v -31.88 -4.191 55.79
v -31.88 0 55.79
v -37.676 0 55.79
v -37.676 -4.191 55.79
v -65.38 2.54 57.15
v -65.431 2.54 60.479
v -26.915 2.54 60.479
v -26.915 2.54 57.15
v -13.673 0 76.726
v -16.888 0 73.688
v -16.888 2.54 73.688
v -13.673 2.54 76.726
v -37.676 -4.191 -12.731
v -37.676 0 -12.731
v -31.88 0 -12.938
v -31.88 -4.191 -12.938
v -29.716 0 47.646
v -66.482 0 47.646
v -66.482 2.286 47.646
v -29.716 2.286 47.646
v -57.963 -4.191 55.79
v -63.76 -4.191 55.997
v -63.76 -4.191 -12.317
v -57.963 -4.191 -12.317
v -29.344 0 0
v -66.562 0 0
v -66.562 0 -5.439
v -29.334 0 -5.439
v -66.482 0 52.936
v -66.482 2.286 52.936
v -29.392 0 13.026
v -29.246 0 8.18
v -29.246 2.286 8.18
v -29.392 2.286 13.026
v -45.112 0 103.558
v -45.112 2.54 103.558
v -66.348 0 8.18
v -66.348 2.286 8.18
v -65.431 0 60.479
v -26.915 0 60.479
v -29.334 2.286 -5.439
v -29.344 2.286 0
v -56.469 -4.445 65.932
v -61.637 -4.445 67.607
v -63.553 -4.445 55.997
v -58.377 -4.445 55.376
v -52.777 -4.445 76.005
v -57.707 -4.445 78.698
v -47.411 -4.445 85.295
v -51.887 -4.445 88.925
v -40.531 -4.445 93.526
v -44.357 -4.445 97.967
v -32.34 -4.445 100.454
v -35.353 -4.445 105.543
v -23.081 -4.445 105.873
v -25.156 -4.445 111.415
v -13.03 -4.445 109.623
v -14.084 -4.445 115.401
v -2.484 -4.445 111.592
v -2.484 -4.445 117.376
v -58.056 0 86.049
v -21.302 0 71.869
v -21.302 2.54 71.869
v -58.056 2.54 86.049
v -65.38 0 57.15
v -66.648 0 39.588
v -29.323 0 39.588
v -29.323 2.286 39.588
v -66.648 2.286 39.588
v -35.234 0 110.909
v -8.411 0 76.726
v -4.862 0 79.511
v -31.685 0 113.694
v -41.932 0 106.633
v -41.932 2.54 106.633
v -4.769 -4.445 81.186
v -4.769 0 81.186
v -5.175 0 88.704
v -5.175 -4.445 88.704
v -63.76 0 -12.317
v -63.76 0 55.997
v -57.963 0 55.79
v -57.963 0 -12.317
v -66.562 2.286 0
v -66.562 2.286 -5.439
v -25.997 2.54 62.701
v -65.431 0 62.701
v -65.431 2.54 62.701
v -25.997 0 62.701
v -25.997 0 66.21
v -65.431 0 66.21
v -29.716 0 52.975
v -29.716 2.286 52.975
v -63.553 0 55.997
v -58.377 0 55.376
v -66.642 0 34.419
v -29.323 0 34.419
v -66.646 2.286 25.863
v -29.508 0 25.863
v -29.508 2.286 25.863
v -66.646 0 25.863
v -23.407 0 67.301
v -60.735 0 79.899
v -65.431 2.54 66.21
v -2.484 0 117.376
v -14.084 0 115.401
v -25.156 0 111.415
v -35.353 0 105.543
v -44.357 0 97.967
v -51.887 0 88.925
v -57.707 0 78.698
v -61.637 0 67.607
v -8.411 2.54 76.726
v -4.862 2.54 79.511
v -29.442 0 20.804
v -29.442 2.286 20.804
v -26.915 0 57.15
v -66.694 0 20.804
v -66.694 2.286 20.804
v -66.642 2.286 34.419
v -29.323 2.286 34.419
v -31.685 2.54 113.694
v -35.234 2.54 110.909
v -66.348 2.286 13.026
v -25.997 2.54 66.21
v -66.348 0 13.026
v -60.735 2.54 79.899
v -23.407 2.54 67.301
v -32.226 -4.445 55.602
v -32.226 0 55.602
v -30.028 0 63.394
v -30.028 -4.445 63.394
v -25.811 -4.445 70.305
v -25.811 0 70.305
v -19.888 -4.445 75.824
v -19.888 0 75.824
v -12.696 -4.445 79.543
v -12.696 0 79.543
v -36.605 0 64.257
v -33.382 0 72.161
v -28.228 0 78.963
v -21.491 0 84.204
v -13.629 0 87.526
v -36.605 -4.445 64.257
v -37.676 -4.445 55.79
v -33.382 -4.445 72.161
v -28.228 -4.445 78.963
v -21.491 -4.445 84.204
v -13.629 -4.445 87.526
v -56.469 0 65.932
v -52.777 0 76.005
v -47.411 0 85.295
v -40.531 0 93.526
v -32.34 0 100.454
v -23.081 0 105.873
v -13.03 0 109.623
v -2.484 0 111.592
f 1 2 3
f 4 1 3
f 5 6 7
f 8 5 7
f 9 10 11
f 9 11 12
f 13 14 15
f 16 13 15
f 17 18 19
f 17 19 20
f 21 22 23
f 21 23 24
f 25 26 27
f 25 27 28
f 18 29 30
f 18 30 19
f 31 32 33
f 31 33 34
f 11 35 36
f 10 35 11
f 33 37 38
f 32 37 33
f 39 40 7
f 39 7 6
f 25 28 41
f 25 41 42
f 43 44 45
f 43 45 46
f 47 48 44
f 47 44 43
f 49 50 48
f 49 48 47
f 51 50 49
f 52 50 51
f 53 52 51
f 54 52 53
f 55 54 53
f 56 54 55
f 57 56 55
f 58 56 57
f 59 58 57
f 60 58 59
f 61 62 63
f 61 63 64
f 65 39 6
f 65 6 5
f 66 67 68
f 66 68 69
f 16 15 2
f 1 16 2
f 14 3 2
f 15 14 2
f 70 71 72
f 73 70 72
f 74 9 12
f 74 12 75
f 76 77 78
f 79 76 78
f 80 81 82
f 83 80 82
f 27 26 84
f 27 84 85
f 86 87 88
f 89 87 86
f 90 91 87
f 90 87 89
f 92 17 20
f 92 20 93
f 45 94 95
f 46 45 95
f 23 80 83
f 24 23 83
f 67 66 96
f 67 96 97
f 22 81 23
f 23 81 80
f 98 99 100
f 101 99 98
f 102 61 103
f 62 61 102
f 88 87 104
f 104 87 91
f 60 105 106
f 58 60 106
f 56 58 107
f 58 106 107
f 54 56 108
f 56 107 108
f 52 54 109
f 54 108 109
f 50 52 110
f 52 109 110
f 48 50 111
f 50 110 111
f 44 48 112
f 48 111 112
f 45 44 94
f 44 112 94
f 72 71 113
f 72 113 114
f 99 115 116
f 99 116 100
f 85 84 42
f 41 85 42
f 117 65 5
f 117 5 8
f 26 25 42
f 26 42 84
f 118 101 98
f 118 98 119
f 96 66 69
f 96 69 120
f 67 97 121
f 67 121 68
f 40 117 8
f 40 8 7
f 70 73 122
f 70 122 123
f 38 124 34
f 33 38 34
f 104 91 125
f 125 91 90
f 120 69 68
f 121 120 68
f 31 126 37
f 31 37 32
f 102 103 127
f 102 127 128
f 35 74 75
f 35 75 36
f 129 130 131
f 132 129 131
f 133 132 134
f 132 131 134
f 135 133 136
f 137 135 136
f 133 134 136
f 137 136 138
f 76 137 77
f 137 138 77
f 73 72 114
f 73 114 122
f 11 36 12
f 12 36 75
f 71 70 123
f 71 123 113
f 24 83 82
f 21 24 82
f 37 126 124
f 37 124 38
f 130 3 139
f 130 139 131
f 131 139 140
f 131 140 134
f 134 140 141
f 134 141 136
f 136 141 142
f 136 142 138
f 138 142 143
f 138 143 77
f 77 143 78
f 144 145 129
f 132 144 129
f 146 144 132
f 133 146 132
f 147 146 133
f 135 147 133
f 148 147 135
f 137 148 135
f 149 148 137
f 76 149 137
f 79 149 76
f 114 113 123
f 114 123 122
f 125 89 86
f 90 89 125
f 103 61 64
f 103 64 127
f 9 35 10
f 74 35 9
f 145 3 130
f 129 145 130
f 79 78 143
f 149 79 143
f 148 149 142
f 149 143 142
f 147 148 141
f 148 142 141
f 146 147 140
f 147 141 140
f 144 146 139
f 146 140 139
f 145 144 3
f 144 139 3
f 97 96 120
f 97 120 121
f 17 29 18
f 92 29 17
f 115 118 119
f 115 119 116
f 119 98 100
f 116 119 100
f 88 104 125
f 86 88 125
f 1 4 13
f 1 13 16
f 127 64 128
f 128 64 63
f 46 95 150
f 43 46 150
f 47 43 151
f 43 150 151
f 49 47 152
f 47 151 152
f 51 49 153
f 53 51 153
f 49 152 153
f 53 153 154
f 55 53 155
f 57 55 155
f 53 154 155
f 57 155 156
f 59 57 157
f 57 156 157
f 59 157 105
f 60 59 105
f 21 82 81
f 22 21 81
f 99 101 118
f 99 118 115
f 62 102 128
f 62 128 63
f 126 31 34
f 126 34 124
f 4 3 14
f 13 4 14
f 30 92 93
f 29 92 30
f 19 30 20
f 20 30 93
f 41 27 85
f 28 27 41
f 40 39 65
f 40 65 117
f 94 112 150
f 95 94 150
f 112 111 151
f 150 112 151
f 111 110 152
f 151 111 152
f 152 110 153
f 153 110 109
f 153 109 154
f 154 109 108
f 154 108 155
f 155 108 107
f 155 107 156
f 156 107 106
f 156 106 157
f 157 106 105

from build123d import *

# Parameters (mm, degrees)
F1_DEPTH = 4.191
F3_DEPTH = 2.286
F5_DEPTH = 4.445
F6_W     = 39.433528
F6_H     = 3.509536
F7_DEPTH = 2.54


with BuildPart() as f1:
    # F0 (on Front) → F1 (new body)
    with BuildSketch(Plane.XZ):
        Polygon((-57.963263, 55.789638), (-63.759588, 55.996653), (-63.759588, -12.317193), (-57.963263, -12.317193), align=None)
        Polygon((-37.676118, 55.789638), (-37.676118, -12.731216), (-31.879794, -12.938244), (-31.879794, 55.789638), align=None)
    extrude(amount=F1_DEPTH)


with BuildPart() as f3:
    # F2 (on Front) → F3 (new body)
    with BuildSketch(Plane.XZ):
        Polygon((-29.343544, 0), (-66.561639, 0), (-66.561639, -5.438766), (-29.333634, -5.438766), align=None)
        Polygon((-29.392071, 13.026311), (-66.347785, 13.026311), (-66.347785, 8.180217), (-29.245931, 8.180217), align=None)
        Polygon((-29.507961, 25.863055), (-66.645918, 25.863055), (-66.694123, 20.803697), (-29.441803, 20.803697), align=None)
        Polygon((-29.323313, 39.587658), (-66.647872, 39.587658), (-66.642486, 34.418572), (-29.323313, 34.418572), align=None)
        Polygon((-29.716219, 52.974727), (-66.481624, 52.936418), (-66.481624, 47.646478), (-29.716219, 47.646478), align=None)
    extrude(amount=-F3_DEPTH)


with BuildPart() as f5:
    # F4 (on Front) → F5 (new body)
    with BuildSketch(Plane.XZ):
        with BuildLine():
            Line((-2.484143, 111.592305), (-2.484143, 117.375842))
            ThreePointArc((-2.484143, 117.375842), (-44.356682, 97.967163), (-63.552573, 55.996649))
            Line((-63.552573, 55.996649), (-58.377285, 55.375613))
            ThreePointArc((-58.377285, 55.375613), (-40.530603, 93.52572), (-2.484143, 111.592305))
        make_face()
        with BuildLine():
            Line((-4.768864, 81.185567), (-5.175292, 88.704489))
            ThreePointArc((-5.175292, 88.704489), (-28.227611, 78.963409), (-37.676122, 55.789638))
            Line((-37.676122, 55.789638), (-32.226157, 55.602058))
            ThreePointArc((-32.226157, 55.602058), (-23.038036, 73.266894), (-4.768864, 81.185567))
        make_face()
    extrude(amount=F5_DEPTH)


with BuildPart() as f7:
    # F6 (on Front) → F7 (new body)
    with BuildSketch(Plane.XZ):
        Polygon((-26.914913, 60.478963), (-65.43088, 60.478963), (-65.380457, 57.149801), (-26.914913, 57.149801), align=None)
        Polygon((-58.056425, 86.049438), (-60.735455, 79.898563), (-23.407212, 67.300513), (-21.301758, 71.868613), align=None)
        Polygon((-41.93192, 106.633499), (-45.112383, 103.558205), (-16.888487, 73.687926), (-13.673015, 76.726168), align=None)
        Polygon((-31.684886, 113.693937), (-35.23431, 110.908709), (-8.411325, 76.726168), (-4.861901, 79.511395), align=None)
        with Locations((-45.714116, 64.455658)):
            Rectangle(F6_W, F6_H)
    extrude(amount=-F7_DEPTH)


solid = Compound([f1.part, f3.part, f5.part, f7.part])
